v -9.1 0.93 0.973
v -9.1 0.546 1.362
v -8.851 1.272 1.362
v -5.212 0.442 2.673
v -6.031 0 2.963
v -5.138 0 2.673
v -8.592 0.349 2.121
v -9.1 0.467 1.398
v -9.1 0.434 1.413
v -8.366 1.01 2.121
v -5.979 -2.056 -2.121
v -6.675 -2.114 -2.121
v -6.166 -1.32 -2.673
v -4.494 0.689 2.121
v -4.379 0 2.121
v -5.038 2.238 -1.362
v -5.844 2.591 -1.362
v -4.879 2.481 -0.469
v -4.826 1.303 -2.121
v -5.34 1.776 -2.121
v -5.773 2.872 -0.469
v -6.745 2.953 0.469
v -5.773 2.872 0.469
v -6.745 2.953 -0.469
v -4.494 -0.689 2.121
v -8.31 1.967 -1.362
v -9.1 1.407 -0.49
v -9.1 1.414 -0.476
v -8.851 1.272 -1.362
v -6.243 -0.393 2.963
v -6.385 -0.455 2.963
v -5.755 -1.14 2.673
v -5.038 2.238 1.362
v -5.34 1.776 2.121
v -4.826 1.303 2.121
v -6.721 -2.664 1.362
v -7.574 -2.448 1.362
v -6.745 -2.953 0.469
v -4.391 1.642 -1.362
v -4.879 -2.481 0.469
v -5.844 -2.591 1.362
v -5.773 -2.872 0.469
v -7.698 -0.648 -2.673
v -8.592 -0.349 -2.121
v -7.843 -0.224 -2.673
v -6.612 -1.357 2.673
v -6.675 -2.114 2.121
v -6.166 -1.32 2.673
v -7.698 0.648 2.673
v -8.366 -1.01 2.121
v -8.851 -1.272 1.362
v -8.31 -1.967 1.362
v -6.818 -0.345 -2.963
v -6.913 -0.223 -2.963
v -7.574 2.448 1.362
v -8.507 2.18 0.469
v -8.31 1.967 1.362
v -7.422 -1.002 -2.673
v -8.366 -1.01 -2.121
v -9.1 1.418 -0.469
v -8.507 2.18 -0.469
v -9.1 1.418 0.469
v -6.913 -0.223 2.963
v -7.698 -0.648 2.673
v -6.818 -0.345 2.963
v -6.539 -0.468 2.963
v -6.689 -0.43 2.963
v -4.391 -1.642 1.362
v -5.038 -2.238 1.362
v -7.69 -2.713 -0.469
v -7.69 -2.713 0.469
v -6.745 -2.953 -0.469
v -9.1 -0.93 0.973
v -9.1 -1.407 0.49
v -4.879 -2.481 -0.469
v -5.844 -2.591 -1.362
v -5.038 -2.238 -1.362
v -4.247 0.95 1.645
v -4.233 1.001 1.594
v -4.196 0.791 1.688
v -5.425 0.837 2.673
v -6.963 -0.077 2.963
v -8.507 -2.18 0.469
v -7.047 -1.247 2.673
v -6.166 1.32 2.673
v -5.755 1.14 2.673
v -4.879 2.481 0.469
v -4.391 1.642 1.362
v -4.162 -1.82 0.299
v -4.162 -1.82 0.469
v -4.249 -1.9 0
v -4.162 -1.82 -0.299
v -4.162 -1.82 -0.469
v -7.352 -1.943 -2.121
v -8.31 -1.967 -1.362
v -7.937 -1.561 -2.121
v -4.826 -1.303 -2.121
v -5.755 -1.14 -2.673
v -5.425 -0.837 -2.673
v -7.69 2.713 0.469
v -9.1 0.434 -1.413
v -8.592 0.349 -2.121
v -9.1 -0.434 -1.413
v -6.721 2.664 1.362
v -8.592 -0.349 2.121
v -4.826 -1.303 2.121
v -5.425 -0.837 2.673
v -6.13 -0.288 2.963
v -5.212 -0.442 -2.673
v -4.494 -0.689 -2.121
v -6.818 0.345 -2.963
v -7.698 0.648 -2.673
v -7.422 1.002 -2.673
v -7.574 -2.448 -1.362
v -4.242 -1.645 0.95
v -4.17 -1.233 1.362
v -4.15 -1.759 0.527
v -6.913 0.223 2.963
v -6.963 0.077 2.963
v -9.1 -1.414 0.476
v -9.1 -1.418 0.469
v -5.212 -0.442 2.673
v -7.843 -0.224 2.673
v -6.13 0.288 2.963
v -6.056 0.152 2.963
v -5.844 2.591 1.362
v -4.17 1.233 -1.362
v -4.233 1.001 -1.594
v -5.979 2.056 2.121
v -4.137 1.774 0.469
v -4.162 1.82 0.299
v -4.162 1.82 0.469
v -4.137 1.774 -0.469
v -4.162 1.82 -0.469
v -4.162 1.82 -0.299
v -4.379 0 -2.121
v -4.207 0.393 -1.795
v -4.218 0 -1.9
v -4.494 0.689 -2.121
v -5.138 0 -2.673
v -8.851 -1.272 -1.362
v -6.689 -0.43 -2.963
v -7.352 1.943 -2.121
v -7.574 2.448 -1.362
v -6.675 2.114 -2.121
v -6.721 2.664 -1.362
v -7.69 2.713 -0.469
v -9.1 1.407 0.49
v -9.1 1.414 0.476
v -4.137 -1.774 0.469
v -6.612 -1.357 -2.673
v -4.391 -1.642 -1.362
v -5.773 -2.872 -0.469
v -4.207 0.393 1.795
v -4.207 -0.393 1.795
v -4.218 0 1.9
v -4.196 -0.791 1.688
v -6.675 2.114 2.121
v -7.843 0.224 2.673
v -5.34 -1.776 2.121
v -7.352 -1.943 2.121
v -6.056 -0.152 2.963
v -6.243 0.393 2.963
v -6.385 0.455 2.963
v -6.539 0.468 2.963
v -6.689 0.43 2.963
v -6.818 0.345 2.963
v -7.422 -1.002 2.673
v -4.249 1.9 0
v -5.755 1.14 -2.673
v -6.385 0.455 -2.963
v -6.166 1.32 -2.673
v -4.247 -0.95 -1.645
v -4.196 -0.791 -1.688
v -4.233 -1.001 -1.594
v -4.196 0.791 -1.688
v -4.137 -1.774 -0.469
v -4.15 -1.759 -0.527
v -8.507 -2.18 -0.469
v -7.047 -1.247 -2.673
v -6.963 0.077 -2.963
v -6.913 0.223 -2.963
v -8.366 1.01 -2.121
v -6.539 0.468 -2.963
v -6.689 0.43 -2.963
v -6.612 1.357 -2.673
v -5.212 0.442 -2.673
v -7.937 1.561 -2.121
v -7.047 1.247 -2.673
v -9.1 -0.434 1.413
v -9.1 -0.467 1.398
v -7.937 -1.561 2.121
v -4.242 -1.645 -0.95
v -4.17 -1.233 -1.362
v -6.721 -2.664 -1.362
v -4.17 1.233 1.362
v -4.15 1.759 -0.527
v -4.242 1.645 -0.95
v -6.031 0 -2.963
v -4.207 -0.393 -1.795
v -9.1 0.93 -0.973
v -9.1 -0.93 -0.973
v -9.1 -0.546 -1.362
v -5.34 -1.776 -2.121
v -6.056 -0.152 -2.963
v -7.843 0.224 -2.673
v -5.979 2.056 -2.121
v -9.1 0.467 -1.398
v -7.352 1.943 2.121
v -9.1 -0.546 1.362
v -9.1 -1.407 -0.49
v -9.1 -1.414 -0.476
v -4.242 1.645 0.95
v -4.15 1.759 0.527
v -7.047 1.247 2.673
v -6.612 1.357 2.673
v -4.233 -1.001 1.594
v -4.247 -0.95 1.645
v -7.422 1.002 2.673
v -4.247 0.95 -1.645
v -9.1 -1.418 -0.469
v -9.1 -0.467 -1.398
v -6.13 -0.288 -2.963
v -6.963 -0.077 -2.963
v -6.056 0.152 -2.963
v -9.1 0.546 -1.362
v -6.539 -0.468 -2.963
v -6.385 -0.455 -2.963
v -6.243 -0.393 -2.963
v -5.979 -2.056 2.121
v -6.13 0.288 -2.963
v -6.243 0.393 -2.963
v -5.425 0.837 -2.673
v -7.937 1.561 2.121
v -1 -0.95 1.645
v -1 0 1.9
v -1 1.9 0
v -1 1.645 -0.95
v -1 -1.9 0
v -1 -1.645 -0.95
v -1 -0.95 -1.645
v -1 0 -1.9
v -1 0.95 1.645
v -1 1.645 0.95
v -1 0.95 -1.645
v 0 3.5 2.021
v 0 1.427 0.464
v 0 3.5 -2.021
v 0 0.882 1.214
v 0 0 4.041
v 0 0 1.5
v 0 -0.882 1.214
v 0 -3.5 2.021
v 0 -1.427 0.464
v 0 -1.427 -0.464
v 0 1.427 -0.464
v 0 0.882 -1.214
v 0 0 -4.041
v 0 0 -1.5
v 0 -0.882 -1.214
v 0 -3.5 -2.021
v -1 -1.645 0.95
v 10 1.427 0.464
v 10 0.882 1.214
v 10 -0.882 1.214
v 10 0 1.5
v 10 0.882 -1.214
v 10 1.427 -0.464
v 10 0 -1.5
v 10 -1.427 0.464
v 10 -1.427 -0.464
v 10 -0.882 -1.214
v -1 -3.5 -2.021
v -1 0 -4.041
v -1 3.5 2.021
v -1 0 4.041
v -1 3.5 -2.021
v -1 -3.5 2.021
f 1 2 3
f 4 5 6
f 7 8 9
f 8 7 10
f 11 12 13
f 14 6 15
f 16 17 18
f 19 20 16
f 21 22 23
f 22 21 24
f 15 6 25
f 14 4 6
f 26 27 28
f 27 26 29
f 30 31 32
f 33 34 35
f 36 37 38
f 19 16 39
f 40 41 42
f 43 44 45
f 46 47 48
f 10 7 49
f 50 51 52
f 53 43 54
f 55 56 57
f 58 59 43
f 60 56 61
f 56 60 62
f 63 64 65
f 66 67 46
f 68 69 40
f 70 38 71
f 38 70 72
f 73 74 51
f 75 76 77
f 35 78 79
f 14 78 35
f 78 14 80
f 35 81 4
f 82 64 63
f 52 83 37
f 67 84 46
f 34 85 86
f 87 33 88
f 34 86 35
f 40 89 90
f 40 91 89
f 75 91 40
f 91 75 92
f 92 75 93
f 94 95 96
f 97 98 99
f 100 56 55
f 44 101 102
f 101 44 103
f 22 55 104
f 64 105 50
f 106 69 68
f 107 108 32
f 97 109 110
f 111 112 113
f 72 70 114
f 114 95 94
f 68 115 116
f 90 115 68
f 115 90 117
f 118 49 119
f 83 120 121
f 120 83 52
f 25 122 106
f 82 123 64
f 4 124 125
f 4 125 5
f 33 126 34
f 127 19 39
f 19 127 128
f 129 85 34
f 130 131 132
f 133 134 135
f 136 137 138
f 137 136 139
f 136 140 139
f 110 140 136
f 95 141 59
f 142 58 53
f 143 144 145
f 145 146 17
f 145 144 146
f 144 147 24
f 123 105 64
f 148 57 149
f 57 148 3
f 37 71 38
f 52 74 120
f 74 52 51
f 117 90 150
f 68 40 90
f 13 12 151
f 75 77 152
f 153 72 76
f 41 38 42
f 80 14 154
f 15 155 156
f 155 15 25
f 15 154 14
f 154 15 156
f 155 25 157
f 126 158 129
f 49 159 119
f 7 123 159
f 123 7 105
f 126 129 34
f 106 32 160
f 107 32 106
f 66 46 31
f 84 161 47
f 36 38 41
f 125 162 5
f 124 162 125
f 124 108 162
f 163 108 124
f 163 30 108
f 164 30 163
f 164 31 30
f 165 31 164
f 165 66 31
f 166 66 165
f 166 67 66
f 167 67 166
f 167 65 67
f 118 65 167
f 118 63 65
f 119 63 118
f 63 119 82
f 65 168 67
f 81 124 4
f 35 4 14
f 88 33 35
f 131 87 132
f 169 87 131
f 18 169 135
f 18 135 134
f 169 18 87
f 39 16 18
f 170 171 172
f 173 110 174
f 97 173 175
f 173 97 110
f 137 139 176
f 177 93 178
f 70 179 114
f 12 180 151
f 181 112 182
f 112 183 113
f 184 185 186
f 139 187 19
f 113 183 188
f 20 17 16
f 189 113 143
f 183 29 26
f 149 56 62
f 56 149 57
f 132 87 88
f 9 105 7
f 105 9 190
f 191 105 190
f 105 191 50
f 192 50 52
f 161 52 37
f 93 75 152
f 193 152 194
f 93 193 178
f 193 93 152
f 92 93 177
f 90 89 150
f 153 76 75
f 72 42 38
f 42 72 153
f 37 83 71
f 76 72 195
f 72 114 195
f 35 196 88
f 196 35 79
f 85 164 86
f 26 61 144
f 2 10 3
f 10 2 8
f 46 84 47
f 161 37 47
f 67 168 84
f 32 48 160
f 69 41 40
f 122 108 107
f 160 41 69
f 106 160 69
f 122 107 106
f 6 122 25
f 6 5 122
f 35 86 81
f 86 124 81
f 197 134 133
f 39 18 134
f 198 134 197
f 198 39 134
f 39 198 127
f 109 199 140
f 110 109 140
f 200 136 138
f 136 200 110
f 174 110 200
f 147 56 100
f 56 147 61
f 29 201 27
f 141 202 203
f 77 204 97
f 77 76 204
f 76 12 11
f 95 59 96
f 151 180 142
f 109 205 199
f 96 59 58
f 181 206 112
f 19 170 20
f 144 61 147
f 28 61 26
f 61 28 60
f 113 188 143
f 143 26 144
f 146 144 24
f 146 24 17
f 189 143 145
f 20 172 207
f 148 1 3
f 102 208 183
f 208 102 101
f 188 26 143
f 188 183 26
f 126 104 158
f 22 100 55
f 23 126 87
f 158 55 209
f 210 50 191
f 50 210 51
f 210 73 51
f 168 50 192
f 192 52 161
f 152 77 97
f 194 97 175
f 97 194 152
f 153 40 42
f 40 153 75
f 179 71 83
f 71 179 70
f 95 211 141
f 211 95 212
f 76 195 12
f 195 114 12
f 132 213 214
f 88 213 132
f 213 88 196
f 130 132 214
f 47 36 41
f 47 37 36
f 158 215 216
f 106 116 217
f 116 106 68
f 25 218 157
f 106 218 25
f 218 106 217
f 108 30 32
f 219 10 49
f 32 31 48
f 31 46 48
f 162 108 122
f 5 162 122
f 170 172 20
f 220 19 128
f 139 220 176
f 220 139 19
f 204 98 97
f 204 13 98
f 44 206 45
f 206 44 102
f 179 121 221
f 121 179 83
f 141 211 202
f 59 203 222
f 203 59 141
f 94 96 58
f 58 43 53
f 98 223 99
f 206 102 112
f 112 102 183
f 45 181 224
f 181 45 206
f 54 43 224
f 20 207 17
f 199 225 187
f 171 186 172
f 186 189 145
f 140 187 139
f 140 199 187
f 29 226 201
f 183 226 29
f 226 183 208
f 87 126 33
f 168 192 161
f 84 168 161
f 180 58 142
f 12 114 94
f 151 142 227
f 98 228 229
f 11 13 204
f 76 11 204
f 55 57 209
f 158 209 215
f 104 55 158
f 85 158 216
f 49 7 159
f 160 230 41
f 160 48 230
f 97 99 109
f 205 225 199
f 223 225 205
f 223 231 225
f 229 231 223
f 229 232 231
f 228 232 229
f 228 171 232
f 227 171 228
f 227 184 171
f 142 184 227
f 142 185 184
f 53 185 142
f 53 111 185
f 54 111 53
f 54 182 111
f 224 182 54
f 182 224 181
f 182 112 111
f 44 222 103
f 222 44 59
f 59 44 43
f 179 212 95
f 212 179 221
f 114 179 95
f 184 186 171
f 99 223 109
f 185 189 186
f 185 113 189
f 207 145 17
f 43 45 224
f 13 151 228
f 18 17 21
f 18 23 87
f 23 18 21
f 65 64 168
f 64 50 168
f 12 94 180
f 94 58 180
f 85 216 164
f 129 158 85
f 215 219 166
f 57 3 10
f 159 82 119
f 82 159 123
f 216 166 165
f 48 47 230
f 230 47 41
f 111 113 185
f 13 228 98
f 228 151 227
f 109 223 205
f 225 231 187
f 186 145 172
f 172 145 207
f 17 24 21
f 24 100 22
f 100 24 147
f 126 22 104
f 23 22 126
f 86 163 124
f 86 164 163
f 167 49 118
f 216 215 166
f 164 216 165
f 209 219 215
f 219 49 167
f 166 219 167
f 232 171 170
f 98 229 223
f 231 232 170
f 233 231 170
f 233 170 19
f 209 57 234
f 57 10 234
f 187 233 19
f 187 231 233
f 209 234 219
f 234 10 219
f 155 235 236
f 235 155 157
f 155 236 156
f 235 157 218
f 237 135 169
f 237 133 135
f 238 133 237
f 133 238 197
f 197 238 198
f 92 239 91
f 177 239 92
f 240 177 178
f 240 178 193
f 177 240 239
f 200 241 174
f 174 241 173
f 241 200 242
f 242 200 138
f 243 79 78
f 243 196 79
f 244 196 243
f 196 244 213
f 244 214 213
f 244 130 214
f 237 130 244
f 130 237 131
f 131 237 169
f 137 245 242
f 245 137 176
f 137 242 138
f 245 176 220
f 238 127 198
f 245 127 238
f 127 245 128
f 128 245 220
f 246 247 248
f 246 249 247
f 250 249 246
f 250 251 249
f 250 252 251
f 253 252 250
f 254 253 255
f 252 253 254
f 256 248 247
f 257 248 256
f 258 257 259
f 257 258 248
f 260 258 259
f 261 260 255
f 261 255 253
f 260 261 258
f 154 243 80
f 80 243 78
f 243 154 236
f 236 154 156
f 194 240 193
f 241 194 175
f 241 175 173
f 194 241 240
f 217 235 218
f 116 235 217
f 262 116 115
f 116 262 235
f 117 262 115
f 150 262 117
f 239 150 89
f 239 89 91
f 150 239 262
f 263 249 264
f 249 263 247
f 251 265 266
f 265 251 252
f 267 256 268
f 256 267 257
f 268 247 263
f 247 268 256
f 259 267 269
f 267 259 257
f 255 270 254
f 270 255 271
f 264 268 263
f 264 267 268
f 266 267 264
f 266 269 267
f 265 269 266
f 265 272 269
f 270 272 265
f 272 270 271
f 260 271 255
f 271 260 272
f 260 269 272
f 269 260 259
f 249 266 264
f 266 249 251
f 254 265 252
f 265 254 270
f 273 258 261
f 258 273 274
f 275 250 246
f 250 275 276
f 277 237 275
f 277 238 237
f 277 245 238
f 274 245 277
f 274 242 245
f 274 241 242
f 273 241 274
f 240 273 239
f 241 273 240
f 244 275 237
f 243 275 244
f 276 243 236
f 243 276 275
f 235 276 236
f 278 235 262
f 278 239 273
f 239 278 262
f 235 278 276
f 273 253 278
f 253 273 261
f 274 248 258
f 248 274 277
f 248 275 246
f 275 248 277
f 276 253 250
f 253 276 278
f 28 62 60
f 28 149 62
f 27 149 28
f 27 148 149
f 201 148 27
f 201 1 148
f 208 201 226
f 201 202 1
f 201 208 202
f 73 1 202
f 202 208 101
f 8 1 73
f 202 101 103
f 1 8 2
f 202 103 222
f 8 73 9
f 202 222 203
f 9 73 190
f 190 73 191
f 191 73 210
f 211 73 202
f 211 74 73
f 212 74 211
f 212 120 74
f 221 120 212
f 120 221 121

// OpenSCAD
// file: ../configuration.scad
$fa = 2;
$fs = 0.5;

motor_end_height=44;
idler_end_height=28;
carriage_height=13.8;
platform_thickness=10;
platform_fix_dia=28;
platform_dia=38;

bearing_diameter=16;
bearing_dia_clearence=0.5;
bearing_free_dia_clearence=0.8;

hotend_diameter=16.4;
hotend_groove_dia=12;

// Frames

// Places mounting holes for the controller
// 33 = RAMPS 1.3 (Power outputs: Extruder, Bed, Fan)
// 34 = RAMPS 1.3 (Power outputs: Extruder0, Extruder1, Bed)
// 35 = RAMPS 1.3 (Power outputs: Extruder, Fan, Fan)
// 70 = Megatronics
// 701 = Megatronics 2.0

motherboard=35;

frame_thickness=8;

// Distance from motor axle to idler axle
// Calculated regarding length of the HTD3M closed belt 
belt_tooth=354;
spacing = round(((belt_tooth*3) - 3.14159 * 24.83) / 2);

rod_length=spacing+55;
rod_diameter=8;
//platform_hinge_offset=25;
//carriage_hinge_offset=17;

printbed_diameter=170;	//printable aera
printbed_thickness=4;		// used for rendering and approximating build volume


//corner_radius=12;
//frame_radius=(tower_radius-rod_diameter/2-corner_radius)/cos(30);

ball_link_distance=40;//55;
ball_offset=6.5;
ball_distance=ball_link_distance-2*ball_offset;
ball_angle=25;

// Delta Settings

delta_smooth_rod_offset=139.5;//140 - 152 floor(printbed_diameter/(2*sin(ball_angle))-printbed_diameter/2+delta_effector_offset+delta_carriage_offset)
delta_effector_offset=18;
delta_carriage_offset=18;
delta_diagonal_rod=ceil(max(printbed_diameter/2+delta_smooth_rod_offset-delta_effector_offset-delta_carriage_offset,printbed_diameter/(2*sin(ball_angle))));
//|-> 202
delta_radius=(delta_smooth_rod_offset-delta_effector_offset-delta_carriage_offset);

diagonal_rod_length=delta_diagonal_rod-2*8;//165
diagonal_rod_diameter=3;
diagonal_rod_length_lost=(printbed_diameter/(2*sin(ball_angle)))-(printbed_diameter/2+delta_smooth_rod_offset-delta_effector_offset-delta_carriage_offset);

diagonal_rod_angle=acos(delta_radius/delta_diagonal_rod);

echo_result=true;

carriage_altitude=sqrt(pow(delta_diagonal_rod,2)-pow(delta_radius,2));



if(echo_result) {
	echo("printbed_diameter",printbed_diameter);
	echo("delta_diagonal_rod",delta_diagonal_rod);
	echo("diagonal_rod_length",diagonal_rod_length);
	echo("delta_effector_offset",delta_effector_offset);
	echo("delta_carriage_offset",delta_carriage_offset);
	echo("delta_radius",delta_radius);
	echo("diagonal_rod_angle",diagonal_rod_angle);
	echo("carriage_altitude",carriage_altitude);
	echo("diagonal_rod_length_lost",diagonal_rod_length_lost);
	echo("delta_smooth_rod_offset_optimum",printbed_diameter/(2*sin(ball_angle))-printbed_diameter/2+delta_effector_offset+delta_carriage_offset);
	echo("rod_length",rod_length);
}
// main file
include <../configuration.scad>;

$fa=2;
$fs=1;

//Kavan Maxi Ball Link 1408

module ball(env) {
	color("grey") difference() {
		union() {
			translate([-ball_offset,0,0]) sphere(r=3,center = true);
			translate([-ball_offset/2,0,0]) rotate([0,90,0]) cylinder( h = ball_offset, r = 3.8/2, center = true);
			translate([5,0,0]) rotate([0,90,0]) cylinder( h = 10, r = 1.5, center = true);
			translate([-0.5,0,0]) rotate([0,90,0]) cylinder( h = 1, r = (7*2/sqrt(3))/2, center = true, $fn = 6);
		}
		translate([-9.6,0,0]) rotate([0,90,0]) cylinder( h = 1, r = 4, center = true, $fn = 6);
	}
	if (env) {
		color("black",0.5) translate([-6.5,0,0]) sphere(r=5,center = true);
	}
}

ball();
//ball(true);
